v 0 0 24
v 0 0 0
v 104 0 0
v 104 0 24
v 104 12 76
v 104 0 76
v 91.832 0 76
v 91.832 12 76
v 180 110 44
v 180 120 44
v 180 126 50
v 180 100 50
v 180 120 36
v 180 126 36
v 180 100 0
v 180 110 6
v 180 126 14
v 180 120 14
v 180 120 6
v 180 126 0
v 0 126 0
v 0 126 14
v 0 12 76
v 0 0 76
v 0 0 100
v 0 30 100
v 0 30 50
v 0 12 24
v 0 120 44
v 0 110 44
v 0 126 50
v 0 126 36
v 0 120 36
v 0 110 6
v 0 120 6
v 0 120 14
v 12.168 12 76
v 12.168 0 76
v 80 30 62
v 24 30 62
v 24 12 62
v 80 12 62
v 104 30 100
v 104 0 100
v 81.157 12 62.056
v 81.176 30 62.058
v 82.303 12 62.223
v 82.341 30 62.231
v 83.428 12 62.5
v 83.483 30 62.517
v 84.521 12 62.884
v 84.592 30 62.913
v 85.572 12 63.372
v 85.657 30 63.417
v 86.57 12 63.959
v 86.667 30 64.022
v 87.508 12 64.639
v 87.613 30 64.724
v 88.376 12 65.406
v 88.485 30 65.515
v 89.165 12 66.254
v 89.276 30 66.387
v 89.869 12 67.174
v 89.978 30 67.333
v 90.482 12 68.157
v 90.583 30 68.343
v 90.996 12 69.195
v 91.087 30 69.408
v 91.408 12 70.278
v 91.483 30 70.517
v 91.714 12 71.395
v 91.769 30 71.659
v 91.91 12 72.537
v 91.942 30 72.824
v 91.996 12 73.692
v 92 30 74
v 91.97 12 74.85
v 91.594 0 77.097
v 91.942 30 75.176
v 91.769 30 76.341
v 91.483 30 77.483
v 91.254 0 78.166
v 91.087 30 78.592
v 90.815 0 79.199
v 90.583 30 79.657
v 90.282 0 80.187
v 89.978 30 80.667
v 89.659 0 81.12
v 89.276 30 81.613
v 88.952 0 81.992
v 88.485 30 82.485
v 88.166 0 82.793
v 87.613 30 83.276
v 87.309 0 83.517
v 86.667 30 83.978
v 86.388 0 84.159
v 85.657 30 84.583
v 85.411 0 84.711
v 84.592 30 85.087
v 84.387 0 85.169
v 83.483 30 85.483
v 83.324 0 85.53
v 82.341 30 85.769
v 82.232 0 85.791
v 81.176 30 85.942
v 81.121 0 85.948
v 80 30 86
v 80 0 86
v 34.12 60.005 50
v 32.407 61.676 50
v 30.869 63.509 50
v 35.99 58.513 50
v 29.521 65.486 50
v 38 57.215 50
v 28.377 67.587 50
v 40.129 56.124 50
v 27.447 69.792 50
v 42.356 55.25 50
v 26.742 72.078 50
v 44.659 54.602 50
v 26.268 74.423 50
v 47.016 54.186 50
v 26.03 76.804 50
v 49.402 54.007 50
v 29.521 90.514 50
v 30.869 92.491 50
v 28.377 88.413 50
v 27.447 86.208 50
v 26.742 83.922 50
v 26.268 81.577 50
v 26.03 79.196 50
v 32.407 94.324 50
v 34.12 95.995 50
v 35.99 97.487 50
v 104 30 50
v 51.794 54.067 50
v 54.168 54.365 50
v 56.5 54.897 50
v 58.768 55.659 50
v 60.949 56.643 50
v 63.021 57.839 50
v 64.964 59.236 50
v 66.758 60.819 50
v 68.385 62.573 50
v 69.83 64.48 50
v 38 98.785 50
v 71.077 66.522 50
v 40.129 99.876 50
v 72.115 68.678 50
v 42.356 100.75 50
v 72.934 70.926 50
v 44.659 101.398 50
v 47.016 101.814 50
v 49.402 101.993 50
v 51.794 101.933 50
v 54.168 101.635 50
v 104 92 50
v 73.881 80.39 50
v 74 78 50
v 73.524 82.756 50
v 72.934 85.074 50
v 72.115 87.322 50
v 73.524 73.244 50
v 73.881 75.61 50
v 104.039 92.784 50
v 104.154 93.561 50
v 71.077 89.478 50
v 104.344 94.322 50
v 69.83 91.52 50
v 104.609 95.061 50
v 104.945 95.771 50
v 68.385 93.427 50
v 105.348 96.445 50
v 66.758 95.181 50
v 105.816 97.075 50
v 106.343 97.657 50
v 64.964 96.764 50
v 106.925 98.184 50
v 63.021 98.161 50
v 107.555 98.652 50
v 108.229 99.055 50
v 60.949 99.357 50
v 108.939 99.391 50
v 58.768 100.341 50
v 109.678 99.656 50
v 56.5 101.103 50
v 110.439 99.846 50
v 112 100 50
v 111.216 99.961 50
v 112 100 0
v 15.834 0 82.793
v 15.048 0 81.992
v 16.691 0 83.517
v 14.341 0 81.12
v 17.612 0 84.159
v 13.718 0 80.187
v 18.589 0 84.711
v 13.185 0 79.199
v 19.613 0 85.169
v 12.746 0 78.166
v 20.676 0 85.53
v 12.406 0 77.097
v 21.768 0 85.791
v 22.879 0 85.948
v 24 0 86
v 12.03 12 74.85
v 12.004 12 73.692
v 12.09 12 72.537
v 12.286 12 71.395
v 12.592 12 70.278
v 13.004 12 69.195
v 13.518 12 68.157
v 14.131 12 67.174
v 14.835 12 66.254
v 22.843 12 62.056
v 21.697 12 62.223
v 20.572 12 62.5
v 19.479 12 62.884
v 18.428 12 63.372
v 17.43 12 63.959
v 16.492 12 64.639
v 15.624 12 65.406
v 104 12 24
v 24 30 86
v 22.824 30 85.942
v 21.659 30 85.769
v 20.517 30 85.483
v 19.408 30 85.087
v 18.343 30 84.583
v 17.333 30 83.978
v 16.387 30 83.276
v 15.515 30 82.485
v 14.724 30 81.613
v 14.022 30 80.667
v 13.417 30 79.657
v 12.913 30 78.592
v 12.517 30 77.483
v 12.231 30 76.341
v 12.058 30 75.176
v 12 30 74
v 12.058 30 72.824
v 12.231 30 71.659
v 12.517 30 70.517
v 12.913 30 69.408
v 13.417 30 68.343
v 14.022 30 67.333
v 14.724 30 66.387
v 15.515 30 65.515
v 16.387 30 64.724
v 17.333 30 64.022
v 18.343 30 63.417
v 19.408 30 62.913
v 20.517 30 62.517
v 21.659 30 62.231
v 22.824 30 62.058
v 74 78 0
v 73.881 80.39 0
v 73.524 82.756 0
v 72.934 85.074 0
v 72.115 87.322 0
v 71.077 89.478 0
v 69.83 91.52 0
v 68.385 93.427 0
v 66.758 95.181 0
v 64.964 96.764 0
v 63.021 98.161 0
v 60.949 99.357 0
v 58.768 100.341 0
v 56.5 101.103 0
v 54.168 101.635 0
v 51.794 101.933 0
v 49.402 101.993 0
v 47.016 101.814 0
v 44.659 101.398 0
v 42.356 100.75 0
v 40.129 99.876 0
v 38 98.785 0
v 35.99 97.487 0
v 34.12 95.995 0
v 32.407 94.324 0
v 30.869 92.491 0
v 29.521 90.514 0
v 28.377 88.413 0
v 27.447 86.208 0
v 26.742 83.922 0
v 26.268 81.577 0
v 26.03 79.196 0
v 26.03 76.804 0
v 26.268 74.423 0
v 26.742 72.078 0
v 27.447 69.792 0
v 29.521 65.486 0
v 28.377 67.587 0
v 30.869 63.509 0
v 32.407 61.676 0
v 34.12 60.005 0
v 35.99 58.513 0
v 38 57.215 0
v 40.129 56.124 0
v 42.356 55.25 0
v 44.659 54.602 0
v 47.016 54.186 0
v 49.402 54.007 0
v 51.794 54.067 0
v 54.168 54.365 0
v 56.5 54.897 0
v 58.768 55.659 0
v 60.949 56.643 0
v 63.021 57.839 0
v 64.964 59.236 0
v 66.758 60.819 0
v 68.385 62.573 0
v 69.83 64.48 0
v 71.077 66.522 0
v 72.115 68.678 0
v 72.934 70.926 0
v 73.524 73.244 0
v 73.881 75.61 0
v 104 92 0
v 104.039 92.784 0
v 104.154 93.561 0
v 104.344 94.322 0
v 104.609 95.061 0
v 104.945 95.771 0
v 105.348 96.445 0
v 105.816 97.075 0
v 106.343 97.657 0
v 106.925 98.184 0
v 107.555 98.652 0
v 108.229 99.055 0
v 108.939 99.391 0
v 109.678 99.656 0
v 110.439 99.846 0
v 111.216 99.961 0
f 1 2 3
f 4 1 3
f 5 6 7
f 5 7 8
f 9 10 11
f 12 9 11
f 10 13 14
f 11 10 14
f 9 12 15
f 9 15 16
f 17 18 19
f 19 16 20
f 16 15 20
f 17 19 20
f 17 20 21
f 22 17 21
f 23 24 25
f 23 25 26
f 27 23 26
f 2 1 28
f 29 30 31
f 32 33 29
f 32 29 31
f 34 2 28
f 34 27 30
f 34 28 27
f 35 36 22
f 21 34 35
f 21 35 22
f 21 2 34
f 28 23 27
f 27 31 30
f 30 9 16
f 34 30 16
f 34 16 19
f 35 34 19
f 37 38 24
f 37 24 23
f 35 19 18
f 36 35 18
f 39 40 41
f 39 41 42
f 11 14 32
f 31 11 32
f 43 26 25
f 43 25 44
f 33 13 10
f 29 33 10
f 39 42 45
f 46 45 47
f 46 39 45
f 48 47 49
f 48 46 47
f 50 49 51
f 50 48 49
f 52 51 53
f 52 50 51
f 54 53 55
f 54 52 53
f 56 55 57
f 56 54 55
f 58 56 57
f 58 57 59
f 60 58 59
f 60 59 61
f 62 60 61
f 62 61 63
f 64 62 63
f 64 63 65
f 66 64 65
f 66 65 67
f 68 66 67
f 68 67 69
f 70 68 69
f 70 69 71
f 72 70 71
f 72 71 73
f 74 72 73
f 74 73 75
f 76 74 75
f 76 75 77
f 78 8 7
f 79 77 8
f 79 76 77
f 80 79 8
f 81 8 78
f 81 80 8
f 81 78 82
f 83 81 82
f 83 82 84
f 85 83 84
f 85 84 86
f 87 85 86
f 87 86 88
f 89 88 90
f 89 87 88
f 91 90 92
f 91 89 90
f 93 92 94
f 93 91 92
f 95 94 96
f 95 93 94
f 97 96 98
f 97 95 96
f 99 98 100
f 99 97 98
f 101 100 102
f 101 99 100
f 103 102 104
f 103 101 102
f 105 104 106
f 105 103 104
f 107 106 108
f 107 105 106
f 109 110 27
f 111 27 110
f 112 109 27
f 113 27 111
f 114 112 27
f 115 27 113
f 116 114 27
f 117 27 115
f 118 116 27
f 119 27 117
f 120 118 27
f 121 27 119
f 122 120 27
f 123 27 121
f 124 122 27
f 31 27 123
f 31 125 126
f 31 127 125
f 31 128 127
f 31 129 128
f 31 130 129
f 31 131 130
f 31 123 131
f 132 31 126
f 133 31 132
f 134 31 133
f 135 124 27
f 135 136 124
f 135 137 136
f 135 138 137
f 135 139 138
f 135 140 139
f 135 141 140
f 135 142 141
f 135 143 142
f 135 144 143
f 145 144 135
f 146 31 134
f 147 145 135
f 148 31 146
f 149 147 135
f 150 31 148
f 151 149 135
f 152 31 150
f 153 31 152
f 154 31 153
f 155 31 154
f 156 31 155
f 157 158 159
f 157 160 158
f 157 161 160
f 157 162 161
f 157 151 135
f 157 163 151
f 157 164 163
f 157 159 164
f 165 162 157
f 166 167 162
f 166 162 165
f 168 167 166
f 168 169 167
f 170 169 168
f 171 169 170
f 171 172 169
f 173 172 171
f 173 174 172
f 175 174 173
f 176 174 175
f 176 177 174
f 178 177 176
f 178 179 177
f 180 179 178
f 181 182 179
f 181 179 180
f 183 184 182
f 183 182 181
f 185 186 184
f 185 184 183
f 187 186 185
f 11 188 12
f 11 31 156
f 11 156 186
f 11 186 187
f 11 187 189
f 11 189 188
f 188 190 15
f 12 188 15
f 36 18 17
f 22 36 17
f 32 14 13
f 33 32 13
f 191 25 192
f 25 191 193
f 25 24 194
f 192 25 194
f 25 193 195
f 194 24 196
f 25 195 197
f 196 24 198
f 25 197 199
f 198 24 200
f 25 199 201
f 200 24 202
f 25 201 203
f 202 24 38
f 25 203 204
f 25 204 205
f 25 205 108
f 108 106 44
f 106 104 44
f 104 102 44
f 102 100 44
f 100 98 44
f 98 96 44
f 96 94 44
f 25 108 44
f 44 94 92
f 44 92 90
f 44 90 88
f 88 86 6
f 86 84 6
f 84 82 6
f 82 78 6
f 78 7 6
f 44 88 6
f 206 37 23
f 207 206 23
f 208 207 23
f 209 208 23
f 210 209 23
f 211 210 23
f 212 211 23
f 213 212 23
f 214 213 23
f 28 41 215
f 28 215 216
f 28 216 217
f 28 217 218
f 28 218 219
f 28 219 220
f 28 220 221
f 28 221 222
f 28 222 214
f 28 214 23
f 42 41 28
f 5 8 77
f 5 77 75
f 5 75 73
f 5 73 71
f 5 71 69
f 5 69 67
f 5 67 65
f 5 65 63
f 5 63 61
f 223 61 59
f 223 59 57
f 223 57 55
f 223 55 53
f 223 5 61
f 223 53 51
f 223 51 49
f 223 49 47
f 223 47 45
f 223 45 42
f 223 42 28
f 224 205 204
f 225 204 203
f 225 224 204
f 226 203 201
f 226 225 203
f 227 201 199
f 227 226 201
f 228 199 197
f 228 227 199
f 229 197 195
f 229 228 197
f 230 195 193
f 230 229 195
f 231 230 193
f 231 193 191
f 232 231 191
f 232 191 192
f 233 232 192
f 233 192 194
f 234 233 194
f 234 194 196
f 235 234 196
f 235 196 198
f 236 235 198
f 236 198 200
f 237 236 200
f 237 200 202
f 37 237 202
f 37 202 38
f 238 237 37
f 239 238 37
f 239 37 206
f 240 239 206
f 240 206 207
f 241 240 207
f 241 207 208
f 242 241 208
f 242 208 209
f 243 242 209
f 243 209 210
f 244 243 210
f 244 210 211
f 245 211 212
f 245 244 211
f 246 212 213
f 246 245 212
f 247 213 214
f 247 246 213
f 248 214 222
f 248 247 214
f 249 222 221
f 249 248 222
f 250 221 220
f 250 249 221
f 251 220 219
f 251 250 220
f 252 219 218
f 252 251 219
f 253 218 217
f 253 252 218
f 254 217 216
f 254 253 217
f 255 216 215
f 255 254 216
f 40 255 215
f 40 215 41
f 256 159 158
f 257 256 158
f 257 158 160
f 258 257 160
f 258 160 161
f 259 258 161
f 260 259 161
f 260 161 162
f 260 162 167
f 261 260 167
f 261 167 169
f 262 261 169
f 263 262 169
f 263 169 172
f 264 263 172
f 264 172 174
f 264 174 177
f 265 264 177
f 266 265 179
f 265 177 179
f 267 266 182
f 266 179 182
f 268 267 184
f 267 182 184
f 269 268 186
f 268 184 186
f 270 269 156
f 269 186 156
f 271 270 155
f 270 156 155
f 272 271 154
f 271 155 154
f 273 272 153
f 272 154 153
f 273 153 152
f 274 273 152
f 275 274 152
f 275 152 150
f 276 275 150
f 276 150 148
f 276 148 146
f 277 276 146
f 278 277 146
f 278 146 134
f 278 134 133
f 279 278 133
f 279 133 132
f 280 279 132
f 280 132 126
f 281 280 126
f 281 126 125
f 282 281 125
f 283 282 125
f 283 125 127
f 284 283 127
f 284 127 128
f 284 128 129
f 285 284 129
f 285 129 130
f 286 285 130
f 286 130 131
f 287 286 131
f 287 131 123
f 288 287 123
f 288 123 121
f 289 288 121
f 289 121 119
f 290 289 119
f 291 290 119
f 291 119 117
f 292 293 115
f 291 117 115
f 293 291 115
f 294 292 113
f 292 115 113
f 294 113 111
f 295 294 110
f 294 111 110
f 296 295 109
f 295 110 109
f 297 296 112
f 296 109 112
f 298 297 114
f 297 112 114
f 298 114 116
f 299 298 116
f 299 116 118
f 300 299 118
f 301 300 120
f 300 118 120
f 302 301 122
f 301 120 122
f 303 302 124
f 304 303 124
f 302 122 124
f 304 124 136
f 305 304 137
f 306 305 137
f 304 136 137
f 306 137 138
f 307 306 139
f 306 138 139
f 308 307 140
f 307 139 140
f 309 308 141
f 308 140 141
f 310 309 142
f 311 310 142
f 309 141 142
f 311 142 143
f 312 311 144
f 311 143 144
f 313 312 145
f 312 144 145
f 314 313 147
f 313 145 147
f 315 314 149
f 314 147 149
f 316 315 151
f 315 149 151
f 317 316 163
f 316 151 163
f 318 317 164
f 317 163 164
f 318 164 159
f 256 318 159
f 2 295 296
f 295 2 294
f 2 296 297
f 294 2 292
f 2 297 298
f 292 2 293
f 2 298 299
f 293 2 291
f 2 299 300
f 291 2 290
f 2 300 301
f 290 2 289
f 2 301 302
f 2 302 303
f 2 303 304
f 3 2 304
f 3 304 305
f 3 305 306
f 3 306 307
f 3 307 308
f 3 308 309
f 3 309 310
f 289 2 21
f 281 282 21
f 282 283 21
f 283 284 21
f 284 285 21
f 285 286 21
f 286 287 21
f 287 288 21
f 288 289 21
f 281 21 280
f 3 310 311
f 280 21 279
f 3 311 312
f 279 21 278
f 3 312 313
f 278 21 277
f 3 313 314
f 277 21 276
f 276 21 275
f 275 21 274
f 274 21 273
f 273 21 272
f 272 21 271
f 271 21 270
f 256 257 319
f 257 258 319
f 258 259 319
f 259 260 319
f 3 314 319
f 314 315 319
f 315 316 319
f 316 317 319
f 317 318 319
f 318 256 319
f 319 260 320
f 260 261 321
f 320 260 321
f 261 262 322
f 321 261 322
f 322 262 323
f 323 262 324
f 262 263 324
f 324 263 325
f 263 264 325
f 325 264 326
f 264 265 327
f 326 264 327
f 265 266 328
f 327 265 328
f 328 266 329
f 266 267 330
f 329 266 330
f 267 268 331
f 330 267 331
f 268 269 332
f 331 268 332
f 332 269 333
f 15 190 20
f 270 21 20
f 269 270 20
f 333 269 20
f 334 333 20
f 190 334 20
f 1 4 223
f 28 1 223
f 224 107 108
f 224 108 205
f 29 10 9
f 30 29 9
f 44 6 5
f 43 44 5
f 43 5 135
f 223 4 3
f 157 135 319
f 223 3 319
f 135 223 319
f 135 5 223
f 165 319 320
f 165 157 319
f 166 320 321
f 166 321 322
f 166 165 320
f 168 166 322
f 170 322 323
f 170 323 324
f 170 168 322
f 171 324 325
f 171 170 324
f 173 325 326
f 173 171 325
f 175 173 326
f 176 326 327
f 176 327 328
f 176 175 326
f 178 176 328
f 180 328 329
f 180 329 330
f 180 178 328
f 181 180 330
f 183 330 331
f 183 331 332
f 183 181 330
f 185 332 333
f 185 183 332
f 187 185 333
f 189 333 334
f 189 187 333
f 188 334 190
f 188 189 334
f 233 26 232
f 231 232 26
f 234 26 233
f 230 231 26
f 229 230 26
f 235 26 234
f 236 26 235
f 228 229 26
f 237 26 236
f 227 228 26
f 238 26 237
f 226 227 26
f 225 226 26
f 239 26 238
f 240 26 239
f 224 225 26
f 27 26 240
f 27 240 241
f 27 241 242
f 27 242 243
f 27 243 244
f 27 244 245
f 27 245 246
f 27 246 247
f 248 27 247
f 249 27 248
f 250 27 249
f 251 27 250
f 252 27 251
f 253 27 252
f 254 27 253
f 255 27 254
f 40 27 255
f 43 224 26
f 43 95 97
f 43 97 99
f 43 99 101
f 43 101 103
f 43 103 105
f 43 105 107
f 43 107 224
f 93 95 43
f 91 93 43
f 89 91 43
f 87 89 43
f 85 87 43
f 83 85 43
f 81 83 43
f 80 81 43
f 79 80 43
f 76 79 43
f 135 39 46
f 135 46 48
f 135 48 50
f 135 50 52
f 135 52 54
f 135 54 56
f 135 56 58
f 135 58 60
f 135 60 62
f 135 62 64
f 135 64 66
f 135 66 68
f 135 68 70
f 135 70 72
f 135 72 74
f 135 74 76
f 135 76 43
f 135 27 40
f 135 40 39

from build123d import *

# Parameters (mm, degrees)
BOSS_EXTRUDE3_DEPTH = 50
SKETCH1_5_W         = 104
SKETCH1_5_H         = 30
BOSS_EXTRUDE4_DEPTH = 100
SKETCH4_W           = 52
SKETCH4_H           = 12
CUT_EXTRUDE1_DEPTH  = 242.404225315
CUT_EXTRUDE2_DEPTH  = 242.404225315
CUT_EXTRUDE3_DEPTH  = 228.191549139
SKETCH7_R           = 24
CUT_EXTRUDE4_DEPTH  = 226.335305711
FILLET3_R           = 8


with BuildPart() as part:
    # Sketch1 → Boss-Extrude3 (new body)
    with BuildSketch(Plane.XY):
        Polygon((0, 126), (0, 30), (104, 30), (104, 100), (180, 100), (180, 126), align=None)
    extrude(amount=BOSS_EXTRUDE3_DEPTH)

    # Sketch1<5> → Boss-Extrude4 (add)
    with BuildSketch(Plane.XY):
        with Locations((52, 15)):
            Rectangle(SKETCH1_5_W, SKETCH1_5_H)
    extrude(amount=BOSS_EXTRUDE4_DEPTH)

    # Sketch4 → Cut-Extrude1 (cut, through all)
    with BuildSketch(Plane(origin=(180, 0, 0), x_dir=(0, 0, -1), z_dir=(1, 0, 0))):
        with Locations((-50, 6)):
            Rectangle(SKETCH4_W, SKETCH4_H)
    extrude(amount=-CUT_EXTRUDE1_DEPTH, mode=Mode.SUBTRACT)

    # Sketch4<5> → Cut-Extrude2 (cut, through all)
    with BuildSketch(Plane(origin=(180, 0, 0), x_dir=(0, 0, -1), z_dir=(1, 0, 0))):
        Polygon((-36, 126), (-36, 120), (-44, 120), (-44, 110), (-6, 110), (-6, 120), (-14, 120), (-14, 126), align=None)
    extrude(amount=-CUT_EXTRUDE2_DEPTH, mode=Mode.SUBTRACT)

    # Sketch5 → Cut-Extrude3 (cut, through all)
    with BuildSketch(Plane(origin=(0, 30, 0), x_dir=(1, 0, 0), z_dir=(0, 1, 0))):
        with BuildLine():
            Line((24, -62), (80, -62))
            ThreePointArc((80, -62), (92, -74), (80, -86))
            Line((80, -86), (24, -86))
            ThreePointArc((24, -86), (12, -74), (24, -62))
        make_face()
    extrude(amount=-CUT_EXTRUDE3_DEPTH, mode=Mode.SUBTRACT)

    # Sketch7 → Cut-Extrude4 (cut, through all)
    with BuildSketch(Plane.XY.offset(50)):
        with Locations((50, 78)):
            Circle(SKETCH7_R)
    extrude(amount=-CUT_EXTRUDE4_DEPTH, mode=Mode.SUBTRACT)

    # Fillet3
    fillet3_edges = [part.edges().sort_by_distance(p)[0] for p in [
        (104, 100, 25),
    ]]
    fillet(fillet3_edges, radius=FILLET3_R)


solid = part.part
